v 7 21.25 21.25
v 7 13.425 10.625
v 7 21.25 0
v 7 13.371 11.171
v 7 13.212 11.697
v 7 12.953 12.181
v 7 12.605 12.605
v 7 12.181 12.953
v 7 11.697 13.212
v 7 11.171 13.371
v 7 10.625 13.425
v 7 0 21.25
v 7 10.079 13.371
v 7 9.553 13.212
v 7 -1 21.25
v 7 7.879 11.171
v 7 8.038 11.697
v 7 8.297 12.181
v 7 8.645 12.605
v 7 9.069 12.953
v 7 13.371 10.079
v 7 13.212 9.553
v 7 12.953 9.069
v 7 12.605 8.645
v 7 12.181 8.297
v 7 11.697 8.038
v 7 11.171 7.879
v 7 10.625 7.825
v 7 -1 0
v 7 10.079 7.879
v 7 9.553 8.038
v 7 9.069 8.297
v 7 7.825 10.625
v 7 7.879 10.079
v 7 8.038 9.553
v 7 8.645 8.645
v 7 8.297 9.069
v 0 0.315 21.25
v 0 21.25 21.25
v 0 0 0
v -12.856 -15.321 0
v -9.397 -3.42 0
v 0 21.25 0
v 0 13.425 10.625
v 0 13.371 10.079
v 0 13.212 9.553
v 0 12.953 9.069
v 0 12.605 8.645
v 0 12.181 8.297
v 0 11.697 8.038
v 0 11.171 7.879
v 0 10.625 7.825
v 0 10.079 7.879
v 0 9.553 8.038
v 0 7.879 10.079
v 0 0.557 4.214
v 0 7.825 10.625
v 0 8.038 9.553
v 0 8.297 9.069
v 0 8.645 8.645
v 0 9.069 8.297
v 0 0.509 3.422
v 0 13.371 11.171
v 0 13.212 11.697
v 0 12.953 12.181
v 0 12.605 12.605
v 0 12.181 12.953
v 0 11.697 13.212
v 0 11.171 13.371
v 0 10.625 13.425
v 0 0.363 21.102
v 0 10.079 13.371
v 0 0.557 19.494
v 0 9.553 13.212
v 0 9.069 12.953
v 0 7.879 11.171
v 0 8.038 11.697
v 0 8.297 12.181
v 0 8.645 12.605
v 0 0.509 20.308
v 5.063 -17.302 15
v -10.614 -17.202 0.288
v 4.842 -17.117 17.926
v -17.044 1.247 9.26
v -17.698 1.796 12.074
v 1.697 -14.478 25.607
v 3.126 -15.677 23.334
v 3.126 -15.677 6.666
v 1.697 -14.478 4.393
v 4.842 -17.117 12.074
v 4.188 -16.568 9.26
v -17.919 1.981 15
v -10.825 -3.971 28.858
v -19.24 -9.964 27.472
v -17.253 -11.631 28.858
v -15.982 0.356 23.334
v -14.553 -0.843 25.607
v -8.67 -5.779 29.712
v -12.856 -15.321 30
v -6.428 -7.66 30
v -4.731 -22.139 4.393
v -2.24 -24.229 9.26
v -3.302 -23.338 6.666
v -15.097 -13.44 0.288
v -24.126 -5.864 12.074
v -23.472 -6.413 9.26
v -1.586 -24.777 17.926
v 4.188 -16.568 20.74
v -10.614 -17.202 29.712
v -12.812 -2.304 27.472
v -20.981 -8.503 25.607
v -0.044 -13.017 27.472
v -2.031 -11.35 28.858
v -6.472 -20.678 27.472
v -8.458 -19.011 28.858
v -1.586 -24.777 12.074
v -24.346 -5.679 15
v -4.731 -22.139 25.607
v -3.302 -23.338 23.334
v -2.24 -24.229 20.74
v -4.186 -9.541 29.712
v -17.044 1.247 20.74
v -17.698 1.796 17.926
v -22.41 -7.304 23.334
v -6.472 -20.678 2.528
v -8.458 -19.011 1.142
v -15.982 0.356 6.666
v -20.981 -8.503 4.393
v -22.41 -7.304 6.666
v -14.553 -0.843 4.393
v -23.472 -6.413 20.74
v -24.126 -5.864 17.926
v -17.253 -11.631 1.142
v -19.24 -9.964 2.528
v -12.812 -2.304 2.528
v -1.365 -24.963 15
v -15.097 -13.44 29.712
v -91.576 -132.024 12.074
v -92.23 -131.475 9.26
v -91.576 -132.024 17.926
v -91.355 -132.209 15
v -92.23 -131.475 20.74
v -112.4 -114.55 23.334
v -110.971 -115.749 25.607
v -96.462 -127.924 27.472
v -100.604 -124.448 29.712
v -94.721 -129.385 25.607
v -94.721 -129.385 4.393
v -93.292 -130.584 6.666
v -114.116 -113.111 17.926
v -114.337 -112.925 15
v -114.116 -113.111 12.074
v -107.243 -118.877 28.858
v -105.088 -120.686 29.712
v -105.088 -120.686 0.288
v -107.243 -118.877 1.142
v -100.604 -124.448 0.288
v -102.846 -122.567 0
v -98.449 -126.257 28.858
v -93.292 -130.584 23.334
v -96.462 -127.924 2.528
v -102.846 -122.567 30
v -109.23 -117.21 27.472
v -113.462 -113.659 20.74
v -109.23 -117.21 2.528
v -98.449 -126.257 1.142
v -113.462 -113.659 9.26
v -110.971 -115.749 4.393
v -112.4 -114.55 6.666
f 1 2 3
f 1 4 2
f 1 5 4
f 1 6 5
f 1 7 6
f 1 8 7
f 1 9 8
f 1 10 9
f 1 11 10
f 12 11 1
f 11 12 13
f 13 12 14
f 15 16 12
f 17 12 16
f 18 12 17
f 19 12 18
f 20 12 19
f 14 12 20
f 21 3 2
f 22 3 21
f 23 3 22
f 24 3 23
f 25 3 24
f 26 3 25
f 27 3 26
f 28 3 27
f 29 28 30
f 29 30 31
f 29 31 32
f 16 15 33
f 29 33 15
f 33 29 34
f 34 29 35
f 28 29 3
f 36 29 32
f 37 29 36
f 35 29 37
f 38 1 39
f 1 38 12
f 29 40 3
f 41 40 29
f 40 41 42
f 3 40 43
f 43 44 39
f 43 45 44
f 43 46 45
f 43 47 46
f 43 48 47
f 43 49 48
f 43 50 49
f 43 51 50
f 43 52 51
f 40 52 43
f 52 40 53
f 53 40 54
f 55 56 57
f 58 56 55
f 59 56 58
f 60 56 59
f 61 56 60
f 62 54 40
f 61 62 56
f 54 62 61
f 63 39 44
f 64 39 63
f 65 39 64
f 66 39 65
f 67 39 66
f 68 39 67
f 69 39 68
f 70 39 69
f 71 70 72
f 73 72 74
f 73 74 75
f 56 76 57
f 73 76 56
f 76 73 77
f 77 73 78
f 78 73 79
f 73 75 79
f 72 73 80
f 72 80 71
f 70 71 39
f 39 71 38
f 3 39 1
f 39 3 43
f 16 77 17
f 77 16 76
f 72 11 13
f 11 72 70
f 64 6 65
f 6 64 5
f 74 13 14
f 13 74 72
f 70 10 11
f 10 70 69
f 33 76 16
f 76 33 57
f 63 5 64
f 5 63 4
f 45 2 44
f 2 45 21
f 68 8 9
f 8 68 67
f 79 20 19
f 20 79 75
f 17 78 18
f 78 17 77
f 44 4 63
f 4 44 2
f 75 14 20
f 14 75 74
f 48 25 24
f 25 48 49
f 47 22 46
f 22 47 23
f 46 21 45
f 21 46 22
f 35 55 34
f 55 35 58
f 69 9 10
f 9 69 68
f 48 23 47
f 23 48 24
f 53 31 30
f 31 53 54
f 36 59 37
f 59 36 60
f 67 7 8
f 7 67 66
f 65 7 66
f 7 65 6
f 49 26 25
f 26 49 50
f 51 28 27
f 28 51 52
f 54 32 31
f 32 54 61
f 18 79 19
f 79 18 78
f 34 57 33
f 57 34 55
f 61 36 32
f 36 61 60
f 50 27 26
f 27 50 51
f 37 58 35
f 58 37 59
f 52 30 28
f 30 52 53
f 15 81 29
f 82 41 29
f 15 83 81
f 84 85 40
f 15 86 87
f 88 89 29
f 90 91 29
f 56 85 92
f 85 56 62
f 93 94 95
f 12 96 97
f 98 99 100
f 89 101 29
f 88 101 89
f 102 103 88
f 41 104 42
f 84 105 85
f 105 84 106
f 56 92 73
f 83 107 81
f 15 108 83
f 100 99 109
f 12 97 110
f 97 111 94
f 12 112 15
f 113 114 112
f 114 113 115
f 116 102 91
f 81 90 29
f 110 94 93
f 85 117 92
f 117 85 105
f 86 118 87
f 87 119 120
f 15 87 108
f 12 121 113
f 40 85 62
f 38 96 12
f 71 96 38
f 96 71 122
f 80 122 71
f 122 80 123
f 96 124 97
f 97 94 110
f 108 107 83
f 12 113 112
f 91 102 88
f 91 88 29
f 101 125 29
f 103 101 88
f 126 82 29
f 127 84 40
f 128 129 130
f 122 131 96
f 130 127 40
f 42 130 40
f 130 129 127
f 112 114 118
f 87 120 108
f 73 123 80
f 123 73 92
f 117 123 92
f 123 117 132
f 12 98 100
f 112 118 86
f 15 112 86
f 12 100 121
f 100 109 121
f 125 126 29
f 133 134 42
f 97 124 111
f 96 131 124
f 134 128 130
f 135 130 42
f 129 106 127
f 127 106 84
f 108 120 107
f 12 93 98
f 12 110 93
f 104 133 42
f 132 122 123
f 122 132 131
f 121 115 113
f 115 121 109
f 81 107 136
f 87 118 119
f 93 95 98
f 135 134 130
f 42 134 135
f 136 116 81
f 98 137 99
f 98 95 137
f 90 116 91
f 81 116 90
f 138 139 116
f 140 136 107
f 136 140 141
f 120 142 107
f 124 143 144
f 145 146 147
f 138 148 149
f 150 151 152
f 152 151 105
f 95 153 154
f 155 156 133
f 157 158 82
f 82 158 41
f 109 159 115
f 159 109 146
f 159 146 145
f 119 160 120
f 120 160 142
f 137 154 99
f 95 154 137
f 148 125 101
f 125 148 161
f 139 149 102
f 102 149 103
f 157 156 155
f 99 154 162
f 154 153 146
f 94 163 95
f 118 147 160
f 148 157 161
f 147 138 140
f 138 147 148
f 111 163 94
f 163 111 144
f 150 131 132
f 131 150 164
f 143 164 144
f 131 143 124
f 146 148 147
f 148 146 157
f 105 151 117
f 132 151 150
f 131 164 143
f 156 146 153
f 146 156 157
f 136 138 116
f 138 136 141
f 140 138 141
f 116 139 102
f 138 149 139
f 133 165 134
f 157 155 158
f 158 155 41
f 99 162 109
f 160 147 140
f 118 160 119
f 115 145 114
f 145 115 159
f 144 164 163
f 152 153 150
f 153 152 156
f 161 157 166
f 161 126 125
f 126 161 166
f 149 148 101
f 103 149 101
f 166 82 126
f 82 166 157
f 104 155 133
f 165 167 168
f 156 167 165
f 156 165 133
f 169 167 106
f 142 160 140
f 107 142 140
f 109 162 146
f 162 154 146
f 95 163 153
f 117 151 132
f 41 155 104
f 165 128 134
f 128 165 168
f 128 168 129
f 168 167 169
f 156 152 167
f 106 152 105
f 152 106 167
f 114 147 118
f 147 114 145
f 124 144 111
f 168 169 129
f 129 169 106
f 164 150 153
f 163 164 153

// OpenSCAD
// file: lib/screw-and-nuts.scad
/**
 * Dimensions of some DIN norm screw heads and bolts
 */

headDin9771Thickness = [
  0,
  0, // M1
  0, //
  1.86,
  2.48,
  3.1,
  3.72,
  0, // NO M7
  4.96,
];

Din9771_d2 = [
  0,
  0, // M1
  0, //
  6.72,
  8.96,
  10.2,
  13.44,
  0, // NO M7
  17.92,
];

hexHeadDin933Thickness=[
  0,
  0, // M1
  1.3,
  2,
  2.8,
  3.5,
  4,
  4.8,
  5.3,
];

hexNutDin934Thickness=[
  0,
  0, // M1
  1.6,
  2.4,
  3.2,
  4,
  5,
  0, // M7 not found
  6.5
];

hexNutWidthAcrossFlats=[
  0,
  0, //M1
  4,
  5.5,
  7,
  8,
  10,
  11,
  13
];
// main file
include <lib/gimbal.scad>

module handle() {
  angle = 70;
  mountHeight=ringHeight*1.25;
  mountWidth=mountHeight;
  difference() {
    cube([wallThickness+bearingHeight, mountWidth, mountHeight]);
    // Subtract bearing
    //translate([wallThickness+bearingHeight, 0.5*mountHeight, 0.5*mountHeight]) rotate([0, -90, 0]) axleBearingNegative();
    translate([wallThickness+bearingHeight, 0.5*mountHeight, 0.5*mountHeight]) rotate([0, -90, 0]) cylinder(r=2.8, h=20);
  }
  
  gripDiameter=30;
  hull() {
    translate([0, -1, 0]) cube([wallThickness+bearingHeight, 1, mountHeight]);
    rotate([0, 0, -angle]) translate([0, -10, 0]) cube([wallThickness+bearingHeight, 1, mountHeight]);
    rotate([0, 0, -40]) translate([0, -10, gripDiameter/2]) rotate([90, 0, 0]) cylinder(r=gripDiameter/2, h=10);
  }
  rotate([0, 0, -40]) translate([0, -10, gripDiameter/2]) rotate([90, 0, 0]) translate([0, 0, 10]) cylinder(r=gripDiameter/2, h=140);
}

handle();
